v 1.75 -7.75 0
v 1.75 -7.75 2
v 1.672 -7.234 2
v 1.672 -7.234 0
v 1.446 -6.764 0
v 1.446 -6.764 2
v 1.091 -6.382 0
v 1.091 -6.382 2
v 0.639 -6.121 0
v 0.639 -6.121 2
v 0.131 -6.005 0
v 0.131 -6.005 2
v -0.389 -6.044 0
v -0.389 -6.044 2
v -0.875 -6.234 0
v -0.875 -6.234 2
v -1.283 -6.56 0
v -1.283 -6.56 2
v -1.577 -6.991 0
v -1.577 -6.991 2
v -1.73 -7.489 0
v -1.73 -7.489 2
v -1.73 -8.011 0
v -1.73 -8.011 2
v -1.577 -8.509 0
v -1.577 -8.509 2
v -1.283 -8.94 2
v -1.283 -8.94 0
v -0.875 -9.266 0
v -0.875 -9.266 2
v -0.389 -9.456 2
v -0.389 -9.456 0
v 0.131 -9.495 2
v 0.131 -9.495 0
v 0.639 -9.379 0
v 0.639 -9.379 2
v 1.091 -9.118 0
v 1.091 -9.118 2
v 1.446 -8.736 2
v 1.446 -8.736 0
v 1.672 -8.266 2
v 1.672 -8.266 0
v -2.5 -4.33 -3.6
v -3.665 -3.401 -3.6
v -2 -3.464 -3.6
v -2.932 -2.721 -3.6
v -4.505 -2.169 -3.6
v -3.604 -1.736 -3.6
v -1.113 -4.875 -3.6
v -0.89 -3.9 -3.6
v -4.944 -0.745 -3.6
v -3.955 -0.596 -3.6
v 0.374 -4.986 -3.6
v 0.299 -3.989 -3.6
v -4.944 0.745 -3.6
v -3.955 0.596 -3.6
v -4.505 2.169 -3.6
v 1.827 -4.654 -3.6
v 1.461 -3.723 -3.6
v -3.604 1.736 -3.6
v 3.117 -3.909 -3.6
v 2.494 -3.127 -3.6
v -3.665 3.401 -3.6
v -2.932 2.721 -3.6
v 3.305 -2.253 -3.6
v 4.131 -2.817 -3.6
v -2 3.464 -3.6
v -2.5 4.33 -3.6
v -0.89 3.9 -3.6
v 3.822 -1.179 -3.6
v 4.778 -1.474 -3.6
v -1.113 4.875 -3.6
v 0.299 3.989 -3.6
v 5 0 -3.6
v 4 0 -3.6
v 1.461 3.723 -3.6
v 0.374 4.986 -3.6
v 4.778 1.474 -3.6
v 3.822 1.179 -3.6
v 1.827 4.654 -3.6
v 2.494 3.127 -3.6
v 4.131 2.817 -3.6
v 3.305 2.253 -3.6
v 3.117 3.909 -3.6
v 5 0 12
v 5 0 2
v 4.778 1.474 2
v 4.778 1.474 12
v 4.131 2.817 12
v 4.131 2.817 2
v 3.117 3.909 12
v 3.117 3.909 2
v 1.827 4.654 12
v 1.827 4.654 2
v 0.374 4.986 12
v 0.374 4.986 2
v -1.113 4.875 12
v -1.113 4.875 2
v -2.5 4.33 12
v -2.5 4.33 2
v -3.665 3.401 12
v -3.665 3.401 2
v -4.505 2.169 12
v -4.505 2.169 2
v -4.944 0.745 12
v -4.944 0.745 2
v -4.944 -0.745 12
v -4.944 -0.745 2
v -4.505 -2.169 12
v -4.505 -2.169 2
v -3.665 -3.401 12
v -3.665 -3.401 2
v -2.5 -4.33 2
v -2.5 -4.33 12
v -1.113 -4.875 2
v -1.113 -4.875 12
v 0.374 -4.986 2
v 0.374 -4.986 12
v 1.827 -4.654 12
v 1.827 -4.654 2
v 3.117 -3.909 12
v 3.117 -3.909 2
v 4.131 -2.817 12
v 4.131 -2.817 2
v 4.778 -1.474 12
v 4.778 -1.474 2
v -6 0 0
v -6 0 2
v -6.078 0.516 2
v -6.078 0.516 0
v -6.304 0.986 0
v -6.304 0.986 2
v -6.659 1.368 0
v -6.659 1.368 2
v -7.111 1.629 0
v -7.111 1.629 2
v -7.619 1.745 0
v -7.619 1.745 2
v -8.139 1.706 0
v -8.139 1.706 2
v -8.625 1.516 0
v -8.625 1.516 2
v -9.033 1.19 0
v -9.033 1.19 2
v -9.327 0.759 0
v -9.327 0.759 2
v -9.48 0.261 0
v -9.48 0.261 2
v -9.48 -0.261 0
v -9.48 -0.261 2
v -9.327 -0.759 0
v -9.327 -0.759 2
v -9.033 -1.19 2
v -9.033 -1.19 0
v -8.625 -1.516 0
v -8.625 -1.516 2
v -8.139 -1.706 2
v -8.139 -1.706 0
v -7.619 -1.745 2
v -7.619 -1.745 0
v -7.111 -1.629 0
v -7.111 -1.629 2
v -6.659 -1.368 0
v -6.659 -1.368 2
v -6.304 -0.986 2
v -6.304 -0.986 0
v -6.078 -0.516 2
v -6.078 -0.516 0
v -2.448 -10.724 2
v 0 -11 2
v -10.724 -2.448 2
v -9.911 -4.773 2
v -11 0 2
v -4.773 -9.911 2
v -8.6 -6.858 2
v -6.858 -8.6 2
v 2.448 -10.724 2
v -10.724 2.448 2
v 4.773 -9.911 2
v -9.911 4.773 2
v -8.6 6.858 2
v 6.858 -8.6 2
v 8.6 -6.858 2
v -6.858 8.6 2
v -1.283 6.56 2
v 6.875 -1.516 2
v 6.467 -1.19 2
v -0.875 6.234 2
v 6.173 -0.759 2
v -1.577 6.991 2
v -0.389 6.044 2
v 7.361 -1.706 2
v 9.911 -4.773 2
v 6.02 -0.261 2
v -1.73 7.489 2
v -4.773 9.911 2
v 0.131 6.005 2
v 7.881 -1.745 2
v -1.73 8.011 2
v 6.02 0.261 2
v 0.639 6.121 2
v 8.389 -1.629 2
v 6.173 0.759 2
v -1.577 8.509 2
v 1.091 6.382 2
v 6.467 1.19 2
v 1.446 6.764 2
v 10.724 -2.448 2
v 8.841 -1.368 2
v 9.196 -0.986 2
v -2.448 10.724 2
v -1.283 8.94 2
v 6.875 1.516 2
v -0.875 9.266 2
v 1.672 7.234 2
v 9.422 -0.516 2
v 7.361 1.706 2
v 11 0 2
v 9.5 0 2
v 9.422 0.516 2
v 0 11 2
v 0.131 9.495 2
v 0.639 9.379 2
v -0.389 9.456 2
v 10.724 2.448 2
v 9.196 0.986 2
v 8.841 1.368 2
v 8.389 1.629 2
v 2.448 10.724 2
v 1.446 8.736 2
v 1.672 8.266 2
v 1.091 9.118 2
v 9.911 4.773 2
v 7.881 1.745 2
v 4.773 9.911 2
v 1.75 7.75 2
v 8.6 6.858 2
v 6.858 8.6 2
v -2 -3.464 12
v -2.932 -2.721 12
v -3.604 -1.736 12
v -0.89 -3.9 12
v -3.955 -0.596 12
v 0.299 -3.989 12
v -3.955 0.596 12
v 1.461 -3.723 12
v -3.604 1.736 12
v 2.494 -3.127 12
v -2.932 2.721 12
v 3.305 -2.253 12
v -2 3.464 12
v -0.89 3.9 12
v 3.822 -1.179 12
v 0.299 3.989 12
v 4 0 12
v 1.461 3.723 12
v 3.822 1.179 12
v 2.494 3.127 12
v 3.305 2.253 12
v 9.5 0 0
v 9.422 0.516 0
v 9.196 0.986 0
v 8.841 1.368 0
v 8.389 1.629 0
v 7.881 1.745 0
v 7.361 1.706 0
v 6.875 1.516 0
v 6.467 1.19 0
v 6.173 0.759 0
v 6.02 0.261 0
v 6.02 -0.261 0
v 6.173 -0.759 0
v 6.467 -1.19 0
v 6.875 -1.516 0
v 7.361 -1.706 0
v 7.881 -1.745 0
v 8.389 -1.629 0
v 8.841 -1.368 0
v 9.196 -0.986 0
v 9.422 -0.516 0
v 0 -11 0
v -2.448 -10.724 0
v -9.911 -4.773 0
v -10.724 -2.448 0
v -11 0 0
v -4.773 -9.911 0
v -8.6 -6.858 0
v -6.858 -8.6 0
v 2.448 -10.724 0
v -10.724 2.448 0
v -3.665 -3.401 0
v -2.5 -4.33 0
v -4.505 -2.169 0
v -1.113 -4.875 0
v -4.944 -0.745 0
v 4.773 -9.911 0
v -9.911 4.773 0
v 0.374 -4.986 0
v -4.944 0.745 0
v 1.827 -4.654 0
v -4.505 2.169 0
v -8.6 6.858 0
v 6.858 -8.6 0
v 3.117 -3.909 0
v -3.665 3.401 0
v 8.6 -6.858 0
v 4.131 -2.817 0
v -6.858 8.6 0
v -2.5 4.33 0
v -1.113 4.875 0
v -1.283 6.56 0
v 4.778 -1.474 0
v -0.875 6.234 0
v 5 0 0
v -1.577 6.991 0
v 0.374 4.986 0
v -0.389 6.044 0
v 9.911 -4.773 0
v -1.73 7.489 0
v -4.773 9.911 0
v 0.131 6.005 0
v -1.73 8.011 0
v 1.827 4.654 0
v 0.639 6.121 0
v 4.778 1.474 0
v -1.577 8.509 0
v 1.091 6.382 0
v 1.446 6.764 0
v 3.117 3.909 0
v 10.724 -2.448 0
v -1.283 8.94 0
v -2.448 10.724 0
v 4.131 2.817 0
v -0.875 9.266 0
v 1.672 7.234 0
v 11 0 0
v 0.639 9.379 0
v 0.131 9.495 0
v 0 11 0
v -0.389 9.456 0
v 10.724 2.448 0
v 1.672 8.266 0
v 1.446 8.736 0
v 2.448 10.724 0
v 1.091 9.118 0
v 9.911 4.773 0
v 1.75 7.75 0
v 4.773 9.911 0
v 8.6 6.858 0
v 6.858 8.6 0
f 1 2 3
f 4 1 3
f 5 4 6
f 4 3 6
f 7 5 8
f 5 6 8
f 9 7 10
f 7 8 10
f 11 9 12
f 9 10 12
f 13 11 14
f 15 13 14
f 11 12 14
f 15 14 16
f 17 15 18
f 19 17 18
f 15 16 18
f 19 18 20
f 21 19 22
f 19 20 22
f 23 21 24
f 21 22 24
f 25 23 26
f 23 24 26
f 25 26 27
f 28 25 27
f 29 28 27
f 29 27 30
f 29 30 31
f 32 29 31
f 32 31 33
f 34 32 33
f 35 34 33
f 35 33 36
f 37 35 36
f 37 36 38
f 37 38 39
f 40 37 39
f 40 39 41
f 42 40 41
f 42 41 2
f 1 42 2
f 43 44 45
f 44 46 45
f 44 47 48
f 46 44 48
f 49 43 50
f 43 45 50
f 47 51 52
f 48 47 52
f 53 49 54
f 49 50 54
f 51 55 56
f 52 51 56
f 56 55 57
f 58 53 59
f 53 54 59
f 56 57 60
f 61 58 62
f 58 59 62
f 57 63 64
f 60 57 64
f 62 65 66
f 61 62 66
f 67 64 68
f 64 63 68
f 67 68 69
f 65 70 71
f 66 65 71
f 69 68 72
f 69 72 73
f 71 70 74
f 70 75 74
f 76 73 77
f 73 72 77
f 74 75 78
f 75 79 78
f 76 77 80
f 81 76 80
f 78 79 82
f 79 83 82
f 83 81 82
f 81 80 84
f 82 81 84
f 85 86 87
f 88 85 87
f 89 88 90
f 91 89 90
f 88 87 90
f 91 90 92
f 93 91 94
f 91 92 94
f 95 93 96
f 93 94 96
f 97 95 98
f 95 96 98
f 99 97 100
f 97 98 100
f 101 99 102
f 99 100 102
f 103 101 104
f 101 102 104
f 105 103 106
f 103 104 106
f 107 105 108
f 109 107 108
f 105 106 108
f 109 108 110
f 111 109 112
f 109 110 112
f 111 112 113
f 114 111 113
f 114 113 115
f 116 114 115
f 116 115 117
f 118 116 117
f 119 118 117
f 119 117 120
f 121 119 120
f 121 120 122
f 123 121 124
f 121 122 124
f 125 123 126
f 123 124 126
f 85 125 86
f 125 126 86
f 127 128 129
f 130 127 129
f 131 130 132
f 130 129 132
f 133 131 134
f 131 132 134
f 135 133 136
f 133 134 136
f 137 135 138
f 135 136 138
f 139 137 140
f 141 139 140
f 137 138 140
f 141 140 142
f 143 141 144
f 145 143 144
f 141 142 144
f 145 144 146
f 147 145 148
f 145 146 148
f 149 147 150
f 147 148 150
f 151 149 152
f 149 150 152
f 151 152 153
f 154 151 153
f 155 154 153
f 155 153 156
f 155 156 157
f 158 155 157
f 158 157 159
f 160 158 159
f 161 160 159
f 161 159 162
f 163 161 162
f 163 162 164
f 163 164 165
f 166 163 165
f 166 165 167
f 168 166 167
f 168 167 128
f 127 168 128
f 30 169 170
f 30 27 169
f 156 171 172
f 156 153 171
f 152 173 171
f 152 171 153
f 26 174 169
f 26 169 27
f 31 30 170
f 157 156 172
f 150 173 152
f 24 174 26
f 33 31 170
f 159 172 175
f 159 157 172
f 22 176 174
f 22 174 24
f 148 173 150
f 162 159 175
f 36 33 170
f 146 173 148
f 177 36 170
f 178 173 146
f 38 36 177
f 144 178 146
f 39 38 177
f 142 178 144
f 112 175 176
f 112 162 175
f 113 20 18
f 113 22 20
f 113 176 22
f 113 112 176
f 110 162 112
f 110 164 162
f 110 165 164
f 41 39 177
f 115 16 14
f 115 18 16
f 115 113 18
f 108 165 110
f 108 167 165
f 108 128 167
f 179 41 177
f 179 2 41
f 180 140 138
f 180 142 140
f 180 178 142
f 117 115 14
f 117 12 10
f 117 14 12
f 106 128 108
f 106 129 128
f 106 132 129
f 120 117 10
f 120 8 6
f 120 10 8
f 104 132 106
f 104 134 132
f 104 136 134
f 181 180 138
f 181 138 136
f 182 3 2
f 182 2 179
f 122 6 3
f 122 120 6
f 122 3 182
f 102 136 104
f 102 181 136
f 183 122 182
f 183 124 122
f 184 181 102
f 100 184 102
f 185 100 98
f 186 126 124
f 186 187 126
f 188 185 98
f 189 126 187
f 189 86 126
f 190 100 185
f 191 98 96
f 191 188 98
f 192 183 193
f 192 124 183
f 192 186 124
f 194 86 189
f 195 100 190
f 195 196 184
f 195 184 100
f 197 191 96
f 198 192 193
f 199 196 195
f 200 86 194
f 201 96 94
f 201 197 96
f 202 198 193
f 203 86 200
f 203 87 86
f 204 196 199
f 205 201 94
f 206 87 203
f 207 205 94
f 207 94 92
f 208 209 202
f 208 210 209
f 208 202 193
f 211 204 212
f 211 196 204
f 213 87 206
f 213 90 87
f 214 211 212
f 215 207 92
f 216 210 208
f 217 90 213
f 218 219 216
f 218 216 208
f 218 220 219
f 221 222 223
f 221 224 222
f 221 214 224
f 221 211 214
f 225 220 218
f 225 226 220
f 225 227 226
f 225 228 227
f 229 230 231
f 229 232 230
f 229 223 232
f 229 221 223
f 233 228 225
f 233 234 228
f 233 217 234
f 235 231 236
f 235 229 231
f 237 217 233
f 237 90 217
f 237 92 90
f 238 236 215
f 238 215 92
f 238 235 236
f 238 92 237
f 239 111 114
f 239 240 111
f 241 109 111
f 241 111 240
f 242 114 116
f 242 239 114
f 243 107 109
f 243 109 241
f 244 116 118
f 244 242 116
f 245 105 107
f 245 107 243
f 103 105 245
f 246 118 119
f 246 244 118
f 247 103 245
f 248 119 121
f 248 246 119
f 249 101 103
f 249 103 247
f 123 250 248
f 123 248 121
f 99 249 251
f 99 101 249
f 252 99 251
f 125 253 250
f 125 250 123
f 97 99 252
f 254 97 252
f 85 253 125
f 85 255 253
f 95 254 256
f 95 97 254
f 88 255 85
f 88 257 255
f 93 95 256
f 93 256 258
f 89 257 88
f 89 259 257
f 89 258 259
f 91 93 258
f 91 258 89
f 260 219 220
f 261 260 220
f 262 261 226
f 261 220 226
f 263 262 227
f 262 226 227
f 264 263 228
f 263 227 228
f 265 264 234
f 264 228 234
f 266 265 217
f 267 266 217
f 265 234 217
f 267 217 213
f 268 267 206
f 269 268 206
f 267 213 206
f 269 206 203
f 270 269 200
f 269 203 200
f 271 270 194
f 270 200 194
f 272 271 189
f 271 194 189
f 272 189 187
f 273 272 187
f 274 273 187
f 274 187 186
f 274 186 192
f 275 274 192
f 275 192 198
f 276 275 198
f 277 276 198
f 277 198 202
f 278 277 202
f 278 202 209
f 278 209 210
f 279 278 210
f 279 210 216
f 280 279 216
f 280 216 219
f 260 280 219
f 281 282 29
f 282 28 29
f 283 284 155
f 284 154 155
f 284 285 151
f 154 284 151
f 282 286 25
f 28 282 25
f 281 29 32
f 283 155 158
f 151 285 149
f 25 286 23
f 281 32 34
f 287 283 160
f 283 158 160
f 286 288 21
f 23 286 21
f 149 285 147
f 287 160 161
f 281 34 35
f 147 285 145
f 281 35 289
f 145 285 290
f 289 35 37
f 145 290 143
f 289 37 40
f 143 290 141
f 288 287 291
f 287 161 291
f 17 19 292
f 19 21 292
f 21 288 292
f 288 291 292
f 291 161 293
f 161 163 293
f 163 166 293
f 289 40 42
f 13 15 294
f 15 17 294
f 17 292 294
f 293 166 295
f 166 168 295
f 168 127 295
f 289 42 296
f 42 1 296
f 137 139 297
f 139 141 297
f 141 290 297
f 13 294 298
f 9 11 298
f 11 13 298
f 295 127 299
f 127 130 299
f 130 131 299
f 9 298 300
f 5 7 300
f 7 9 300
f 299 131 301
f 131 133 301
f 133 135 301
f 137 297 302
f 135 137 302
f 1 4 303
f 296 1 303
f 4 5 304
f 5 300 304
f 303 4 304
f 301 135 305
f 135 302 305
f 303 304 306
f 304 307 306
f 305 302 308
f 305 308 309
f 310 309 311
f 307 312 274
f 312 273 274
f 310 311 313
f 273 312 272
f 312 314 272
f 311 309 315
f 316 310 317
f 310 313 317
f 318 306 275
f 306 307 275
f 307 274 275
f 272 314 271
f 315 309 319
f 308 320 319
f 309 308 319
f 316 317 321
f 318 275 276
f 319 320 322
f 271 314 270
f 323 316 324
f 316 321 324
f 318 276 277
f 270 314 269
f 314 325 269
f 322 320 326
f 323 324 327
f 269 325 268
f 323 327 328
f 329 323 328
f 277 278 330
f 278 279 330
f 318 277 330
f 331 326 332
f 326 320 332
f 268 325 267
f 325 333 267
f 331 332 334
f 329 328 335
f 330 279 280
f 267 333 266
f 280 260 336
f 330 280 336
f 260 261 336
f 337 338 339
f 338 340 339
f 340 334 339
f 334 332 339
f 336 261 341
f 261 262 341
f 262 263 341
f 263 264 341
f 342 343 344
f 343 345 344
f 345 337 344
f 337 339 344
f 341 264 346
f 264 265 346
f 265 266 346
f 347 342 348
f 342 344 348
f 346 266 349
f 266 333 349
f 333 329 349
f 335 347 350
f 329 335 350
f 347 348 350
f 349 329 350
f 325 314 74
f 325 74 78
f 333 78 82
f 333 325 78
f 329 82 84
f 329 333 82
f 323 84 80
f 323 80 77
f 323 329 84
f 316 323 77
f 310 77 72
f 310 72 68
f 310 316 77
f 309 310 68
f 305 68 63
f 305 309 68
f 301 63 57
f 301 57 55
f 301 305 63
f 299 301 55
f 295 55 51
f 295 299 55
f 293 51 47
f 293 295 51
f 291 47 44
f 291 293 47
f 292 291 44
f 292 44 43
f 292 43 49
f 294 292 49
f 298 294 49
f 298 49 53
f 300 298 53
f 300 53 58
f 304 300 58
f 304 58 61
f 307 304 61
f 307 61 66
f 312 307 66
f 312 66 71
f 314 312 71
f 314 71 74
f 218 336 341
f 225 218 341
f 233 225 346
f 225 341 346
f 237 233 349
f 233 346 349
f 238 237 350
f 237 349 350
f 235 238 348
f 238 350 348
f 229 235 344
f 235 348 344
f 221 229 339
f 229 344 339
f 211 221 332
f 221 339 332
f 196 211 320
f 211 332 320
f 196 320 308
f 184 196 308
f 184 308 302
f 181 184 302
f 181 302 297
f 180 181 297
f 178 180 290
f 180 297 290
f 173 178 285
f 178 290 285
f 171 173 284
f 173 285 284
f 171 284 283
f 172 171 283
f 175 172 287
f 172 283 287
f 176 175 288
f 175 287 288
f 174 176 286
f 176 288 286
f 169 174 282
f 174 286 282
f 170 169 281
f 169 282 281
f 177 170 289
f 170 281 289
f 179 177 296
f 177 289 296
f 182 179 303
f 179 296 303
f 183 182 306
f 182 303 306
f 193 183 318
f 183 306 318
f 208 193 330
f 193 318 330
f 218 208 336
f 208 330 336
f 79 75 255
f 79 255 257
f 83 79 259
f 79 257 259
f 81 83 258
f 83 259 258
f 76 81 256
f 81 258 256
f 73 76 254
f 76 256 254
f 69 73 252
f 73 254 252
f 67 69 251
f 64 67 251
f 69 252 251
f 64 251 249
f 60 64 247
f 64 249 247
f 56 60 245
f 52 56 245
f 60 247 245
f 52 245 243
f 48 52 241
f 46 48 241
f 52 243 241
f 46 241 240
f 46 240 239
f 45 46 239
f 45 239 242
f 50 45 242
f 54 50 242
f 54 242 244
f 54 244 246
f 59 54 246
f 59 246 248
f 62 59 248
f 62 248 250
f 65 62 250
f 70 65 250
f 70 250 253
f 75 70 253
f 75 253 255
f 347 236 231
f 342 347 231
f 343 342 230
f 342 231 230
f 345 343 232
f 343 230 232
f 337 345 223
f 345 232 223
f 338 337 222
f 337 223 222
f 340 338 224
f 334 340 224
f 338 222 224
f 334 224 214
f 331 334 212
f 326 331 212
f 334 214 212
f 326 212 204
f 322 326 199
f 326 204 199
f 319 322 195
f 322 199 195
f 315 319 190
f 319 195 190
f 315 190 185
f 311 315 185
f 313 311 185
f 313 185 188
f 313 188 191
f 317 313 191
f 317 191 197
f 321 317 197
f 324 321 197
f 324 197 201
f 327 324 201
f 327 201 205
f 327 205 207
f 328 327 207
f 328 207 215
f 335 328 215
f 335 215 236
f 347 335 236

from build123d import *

# Parameters (mm, degrees)
SKETCH_R          = 11
PAD_DEPTH         = 2
SKETCH002_R       = 4
SKETCH002_R_2     = 1.75
POCKET_DEPTH      = 2.001
SKETCH003_R       = 5
PAD001_DEPTH      = 10
PAD001_DEPTH_BACK = 5.6
SKETCH004_R       = 4
POCKET001_DEPTH   = 15.601


with BuildPart() as part:
    # Sketch → Pad (new body)
    with BuildSketch(Plane.XY):
        Circle(SKETCH_R)
    extrude(amount=PAD_DEPTH)

    # Sketch002 (on Face3 of Pad) → Pocket (cut, through all)
    with BuildSketch(Plane.XY.offset(2)):
        Circle(SKETCH002_R)
        with Locations((0, -7.75)):
            Circle(SKETCH002_R_2)
        with Locations((-7.75, 0)):
            Circle(SKETCH002_R_2)
        with Locations((0, 7.75)):
            Circle(SKETCH002_R_2)
        with Locations((7.75, 0)):
            Circle(SKETCH002_R_2)
    extrude(amount=-POCKET_DEPTH, mode=Mode.SUBTRACT)

    # Sketch003 (on Face3 of Pocket) → Pad001 (join, two sides)
    with BuildSketch(Plane.XY.offset(2)) as pad001_sk:
        Circle(SKETCH003_R)
    extrude(amount=PAD001_DEPTH)
    extrude(pad001_sk.sketch, amount=-PAD001_DEPTH_BACK)

    # Sketch004 (on Face11 of Pad001) → Pocket001 (cut, through all)
    with BuildSketch(Plane.XY.offset(12)):
        Circle(SKETCH004_R)
    extrude(amount=-POCKET001_DEPTH, mode=Mode.SUBTRACT)


solid = part.part
